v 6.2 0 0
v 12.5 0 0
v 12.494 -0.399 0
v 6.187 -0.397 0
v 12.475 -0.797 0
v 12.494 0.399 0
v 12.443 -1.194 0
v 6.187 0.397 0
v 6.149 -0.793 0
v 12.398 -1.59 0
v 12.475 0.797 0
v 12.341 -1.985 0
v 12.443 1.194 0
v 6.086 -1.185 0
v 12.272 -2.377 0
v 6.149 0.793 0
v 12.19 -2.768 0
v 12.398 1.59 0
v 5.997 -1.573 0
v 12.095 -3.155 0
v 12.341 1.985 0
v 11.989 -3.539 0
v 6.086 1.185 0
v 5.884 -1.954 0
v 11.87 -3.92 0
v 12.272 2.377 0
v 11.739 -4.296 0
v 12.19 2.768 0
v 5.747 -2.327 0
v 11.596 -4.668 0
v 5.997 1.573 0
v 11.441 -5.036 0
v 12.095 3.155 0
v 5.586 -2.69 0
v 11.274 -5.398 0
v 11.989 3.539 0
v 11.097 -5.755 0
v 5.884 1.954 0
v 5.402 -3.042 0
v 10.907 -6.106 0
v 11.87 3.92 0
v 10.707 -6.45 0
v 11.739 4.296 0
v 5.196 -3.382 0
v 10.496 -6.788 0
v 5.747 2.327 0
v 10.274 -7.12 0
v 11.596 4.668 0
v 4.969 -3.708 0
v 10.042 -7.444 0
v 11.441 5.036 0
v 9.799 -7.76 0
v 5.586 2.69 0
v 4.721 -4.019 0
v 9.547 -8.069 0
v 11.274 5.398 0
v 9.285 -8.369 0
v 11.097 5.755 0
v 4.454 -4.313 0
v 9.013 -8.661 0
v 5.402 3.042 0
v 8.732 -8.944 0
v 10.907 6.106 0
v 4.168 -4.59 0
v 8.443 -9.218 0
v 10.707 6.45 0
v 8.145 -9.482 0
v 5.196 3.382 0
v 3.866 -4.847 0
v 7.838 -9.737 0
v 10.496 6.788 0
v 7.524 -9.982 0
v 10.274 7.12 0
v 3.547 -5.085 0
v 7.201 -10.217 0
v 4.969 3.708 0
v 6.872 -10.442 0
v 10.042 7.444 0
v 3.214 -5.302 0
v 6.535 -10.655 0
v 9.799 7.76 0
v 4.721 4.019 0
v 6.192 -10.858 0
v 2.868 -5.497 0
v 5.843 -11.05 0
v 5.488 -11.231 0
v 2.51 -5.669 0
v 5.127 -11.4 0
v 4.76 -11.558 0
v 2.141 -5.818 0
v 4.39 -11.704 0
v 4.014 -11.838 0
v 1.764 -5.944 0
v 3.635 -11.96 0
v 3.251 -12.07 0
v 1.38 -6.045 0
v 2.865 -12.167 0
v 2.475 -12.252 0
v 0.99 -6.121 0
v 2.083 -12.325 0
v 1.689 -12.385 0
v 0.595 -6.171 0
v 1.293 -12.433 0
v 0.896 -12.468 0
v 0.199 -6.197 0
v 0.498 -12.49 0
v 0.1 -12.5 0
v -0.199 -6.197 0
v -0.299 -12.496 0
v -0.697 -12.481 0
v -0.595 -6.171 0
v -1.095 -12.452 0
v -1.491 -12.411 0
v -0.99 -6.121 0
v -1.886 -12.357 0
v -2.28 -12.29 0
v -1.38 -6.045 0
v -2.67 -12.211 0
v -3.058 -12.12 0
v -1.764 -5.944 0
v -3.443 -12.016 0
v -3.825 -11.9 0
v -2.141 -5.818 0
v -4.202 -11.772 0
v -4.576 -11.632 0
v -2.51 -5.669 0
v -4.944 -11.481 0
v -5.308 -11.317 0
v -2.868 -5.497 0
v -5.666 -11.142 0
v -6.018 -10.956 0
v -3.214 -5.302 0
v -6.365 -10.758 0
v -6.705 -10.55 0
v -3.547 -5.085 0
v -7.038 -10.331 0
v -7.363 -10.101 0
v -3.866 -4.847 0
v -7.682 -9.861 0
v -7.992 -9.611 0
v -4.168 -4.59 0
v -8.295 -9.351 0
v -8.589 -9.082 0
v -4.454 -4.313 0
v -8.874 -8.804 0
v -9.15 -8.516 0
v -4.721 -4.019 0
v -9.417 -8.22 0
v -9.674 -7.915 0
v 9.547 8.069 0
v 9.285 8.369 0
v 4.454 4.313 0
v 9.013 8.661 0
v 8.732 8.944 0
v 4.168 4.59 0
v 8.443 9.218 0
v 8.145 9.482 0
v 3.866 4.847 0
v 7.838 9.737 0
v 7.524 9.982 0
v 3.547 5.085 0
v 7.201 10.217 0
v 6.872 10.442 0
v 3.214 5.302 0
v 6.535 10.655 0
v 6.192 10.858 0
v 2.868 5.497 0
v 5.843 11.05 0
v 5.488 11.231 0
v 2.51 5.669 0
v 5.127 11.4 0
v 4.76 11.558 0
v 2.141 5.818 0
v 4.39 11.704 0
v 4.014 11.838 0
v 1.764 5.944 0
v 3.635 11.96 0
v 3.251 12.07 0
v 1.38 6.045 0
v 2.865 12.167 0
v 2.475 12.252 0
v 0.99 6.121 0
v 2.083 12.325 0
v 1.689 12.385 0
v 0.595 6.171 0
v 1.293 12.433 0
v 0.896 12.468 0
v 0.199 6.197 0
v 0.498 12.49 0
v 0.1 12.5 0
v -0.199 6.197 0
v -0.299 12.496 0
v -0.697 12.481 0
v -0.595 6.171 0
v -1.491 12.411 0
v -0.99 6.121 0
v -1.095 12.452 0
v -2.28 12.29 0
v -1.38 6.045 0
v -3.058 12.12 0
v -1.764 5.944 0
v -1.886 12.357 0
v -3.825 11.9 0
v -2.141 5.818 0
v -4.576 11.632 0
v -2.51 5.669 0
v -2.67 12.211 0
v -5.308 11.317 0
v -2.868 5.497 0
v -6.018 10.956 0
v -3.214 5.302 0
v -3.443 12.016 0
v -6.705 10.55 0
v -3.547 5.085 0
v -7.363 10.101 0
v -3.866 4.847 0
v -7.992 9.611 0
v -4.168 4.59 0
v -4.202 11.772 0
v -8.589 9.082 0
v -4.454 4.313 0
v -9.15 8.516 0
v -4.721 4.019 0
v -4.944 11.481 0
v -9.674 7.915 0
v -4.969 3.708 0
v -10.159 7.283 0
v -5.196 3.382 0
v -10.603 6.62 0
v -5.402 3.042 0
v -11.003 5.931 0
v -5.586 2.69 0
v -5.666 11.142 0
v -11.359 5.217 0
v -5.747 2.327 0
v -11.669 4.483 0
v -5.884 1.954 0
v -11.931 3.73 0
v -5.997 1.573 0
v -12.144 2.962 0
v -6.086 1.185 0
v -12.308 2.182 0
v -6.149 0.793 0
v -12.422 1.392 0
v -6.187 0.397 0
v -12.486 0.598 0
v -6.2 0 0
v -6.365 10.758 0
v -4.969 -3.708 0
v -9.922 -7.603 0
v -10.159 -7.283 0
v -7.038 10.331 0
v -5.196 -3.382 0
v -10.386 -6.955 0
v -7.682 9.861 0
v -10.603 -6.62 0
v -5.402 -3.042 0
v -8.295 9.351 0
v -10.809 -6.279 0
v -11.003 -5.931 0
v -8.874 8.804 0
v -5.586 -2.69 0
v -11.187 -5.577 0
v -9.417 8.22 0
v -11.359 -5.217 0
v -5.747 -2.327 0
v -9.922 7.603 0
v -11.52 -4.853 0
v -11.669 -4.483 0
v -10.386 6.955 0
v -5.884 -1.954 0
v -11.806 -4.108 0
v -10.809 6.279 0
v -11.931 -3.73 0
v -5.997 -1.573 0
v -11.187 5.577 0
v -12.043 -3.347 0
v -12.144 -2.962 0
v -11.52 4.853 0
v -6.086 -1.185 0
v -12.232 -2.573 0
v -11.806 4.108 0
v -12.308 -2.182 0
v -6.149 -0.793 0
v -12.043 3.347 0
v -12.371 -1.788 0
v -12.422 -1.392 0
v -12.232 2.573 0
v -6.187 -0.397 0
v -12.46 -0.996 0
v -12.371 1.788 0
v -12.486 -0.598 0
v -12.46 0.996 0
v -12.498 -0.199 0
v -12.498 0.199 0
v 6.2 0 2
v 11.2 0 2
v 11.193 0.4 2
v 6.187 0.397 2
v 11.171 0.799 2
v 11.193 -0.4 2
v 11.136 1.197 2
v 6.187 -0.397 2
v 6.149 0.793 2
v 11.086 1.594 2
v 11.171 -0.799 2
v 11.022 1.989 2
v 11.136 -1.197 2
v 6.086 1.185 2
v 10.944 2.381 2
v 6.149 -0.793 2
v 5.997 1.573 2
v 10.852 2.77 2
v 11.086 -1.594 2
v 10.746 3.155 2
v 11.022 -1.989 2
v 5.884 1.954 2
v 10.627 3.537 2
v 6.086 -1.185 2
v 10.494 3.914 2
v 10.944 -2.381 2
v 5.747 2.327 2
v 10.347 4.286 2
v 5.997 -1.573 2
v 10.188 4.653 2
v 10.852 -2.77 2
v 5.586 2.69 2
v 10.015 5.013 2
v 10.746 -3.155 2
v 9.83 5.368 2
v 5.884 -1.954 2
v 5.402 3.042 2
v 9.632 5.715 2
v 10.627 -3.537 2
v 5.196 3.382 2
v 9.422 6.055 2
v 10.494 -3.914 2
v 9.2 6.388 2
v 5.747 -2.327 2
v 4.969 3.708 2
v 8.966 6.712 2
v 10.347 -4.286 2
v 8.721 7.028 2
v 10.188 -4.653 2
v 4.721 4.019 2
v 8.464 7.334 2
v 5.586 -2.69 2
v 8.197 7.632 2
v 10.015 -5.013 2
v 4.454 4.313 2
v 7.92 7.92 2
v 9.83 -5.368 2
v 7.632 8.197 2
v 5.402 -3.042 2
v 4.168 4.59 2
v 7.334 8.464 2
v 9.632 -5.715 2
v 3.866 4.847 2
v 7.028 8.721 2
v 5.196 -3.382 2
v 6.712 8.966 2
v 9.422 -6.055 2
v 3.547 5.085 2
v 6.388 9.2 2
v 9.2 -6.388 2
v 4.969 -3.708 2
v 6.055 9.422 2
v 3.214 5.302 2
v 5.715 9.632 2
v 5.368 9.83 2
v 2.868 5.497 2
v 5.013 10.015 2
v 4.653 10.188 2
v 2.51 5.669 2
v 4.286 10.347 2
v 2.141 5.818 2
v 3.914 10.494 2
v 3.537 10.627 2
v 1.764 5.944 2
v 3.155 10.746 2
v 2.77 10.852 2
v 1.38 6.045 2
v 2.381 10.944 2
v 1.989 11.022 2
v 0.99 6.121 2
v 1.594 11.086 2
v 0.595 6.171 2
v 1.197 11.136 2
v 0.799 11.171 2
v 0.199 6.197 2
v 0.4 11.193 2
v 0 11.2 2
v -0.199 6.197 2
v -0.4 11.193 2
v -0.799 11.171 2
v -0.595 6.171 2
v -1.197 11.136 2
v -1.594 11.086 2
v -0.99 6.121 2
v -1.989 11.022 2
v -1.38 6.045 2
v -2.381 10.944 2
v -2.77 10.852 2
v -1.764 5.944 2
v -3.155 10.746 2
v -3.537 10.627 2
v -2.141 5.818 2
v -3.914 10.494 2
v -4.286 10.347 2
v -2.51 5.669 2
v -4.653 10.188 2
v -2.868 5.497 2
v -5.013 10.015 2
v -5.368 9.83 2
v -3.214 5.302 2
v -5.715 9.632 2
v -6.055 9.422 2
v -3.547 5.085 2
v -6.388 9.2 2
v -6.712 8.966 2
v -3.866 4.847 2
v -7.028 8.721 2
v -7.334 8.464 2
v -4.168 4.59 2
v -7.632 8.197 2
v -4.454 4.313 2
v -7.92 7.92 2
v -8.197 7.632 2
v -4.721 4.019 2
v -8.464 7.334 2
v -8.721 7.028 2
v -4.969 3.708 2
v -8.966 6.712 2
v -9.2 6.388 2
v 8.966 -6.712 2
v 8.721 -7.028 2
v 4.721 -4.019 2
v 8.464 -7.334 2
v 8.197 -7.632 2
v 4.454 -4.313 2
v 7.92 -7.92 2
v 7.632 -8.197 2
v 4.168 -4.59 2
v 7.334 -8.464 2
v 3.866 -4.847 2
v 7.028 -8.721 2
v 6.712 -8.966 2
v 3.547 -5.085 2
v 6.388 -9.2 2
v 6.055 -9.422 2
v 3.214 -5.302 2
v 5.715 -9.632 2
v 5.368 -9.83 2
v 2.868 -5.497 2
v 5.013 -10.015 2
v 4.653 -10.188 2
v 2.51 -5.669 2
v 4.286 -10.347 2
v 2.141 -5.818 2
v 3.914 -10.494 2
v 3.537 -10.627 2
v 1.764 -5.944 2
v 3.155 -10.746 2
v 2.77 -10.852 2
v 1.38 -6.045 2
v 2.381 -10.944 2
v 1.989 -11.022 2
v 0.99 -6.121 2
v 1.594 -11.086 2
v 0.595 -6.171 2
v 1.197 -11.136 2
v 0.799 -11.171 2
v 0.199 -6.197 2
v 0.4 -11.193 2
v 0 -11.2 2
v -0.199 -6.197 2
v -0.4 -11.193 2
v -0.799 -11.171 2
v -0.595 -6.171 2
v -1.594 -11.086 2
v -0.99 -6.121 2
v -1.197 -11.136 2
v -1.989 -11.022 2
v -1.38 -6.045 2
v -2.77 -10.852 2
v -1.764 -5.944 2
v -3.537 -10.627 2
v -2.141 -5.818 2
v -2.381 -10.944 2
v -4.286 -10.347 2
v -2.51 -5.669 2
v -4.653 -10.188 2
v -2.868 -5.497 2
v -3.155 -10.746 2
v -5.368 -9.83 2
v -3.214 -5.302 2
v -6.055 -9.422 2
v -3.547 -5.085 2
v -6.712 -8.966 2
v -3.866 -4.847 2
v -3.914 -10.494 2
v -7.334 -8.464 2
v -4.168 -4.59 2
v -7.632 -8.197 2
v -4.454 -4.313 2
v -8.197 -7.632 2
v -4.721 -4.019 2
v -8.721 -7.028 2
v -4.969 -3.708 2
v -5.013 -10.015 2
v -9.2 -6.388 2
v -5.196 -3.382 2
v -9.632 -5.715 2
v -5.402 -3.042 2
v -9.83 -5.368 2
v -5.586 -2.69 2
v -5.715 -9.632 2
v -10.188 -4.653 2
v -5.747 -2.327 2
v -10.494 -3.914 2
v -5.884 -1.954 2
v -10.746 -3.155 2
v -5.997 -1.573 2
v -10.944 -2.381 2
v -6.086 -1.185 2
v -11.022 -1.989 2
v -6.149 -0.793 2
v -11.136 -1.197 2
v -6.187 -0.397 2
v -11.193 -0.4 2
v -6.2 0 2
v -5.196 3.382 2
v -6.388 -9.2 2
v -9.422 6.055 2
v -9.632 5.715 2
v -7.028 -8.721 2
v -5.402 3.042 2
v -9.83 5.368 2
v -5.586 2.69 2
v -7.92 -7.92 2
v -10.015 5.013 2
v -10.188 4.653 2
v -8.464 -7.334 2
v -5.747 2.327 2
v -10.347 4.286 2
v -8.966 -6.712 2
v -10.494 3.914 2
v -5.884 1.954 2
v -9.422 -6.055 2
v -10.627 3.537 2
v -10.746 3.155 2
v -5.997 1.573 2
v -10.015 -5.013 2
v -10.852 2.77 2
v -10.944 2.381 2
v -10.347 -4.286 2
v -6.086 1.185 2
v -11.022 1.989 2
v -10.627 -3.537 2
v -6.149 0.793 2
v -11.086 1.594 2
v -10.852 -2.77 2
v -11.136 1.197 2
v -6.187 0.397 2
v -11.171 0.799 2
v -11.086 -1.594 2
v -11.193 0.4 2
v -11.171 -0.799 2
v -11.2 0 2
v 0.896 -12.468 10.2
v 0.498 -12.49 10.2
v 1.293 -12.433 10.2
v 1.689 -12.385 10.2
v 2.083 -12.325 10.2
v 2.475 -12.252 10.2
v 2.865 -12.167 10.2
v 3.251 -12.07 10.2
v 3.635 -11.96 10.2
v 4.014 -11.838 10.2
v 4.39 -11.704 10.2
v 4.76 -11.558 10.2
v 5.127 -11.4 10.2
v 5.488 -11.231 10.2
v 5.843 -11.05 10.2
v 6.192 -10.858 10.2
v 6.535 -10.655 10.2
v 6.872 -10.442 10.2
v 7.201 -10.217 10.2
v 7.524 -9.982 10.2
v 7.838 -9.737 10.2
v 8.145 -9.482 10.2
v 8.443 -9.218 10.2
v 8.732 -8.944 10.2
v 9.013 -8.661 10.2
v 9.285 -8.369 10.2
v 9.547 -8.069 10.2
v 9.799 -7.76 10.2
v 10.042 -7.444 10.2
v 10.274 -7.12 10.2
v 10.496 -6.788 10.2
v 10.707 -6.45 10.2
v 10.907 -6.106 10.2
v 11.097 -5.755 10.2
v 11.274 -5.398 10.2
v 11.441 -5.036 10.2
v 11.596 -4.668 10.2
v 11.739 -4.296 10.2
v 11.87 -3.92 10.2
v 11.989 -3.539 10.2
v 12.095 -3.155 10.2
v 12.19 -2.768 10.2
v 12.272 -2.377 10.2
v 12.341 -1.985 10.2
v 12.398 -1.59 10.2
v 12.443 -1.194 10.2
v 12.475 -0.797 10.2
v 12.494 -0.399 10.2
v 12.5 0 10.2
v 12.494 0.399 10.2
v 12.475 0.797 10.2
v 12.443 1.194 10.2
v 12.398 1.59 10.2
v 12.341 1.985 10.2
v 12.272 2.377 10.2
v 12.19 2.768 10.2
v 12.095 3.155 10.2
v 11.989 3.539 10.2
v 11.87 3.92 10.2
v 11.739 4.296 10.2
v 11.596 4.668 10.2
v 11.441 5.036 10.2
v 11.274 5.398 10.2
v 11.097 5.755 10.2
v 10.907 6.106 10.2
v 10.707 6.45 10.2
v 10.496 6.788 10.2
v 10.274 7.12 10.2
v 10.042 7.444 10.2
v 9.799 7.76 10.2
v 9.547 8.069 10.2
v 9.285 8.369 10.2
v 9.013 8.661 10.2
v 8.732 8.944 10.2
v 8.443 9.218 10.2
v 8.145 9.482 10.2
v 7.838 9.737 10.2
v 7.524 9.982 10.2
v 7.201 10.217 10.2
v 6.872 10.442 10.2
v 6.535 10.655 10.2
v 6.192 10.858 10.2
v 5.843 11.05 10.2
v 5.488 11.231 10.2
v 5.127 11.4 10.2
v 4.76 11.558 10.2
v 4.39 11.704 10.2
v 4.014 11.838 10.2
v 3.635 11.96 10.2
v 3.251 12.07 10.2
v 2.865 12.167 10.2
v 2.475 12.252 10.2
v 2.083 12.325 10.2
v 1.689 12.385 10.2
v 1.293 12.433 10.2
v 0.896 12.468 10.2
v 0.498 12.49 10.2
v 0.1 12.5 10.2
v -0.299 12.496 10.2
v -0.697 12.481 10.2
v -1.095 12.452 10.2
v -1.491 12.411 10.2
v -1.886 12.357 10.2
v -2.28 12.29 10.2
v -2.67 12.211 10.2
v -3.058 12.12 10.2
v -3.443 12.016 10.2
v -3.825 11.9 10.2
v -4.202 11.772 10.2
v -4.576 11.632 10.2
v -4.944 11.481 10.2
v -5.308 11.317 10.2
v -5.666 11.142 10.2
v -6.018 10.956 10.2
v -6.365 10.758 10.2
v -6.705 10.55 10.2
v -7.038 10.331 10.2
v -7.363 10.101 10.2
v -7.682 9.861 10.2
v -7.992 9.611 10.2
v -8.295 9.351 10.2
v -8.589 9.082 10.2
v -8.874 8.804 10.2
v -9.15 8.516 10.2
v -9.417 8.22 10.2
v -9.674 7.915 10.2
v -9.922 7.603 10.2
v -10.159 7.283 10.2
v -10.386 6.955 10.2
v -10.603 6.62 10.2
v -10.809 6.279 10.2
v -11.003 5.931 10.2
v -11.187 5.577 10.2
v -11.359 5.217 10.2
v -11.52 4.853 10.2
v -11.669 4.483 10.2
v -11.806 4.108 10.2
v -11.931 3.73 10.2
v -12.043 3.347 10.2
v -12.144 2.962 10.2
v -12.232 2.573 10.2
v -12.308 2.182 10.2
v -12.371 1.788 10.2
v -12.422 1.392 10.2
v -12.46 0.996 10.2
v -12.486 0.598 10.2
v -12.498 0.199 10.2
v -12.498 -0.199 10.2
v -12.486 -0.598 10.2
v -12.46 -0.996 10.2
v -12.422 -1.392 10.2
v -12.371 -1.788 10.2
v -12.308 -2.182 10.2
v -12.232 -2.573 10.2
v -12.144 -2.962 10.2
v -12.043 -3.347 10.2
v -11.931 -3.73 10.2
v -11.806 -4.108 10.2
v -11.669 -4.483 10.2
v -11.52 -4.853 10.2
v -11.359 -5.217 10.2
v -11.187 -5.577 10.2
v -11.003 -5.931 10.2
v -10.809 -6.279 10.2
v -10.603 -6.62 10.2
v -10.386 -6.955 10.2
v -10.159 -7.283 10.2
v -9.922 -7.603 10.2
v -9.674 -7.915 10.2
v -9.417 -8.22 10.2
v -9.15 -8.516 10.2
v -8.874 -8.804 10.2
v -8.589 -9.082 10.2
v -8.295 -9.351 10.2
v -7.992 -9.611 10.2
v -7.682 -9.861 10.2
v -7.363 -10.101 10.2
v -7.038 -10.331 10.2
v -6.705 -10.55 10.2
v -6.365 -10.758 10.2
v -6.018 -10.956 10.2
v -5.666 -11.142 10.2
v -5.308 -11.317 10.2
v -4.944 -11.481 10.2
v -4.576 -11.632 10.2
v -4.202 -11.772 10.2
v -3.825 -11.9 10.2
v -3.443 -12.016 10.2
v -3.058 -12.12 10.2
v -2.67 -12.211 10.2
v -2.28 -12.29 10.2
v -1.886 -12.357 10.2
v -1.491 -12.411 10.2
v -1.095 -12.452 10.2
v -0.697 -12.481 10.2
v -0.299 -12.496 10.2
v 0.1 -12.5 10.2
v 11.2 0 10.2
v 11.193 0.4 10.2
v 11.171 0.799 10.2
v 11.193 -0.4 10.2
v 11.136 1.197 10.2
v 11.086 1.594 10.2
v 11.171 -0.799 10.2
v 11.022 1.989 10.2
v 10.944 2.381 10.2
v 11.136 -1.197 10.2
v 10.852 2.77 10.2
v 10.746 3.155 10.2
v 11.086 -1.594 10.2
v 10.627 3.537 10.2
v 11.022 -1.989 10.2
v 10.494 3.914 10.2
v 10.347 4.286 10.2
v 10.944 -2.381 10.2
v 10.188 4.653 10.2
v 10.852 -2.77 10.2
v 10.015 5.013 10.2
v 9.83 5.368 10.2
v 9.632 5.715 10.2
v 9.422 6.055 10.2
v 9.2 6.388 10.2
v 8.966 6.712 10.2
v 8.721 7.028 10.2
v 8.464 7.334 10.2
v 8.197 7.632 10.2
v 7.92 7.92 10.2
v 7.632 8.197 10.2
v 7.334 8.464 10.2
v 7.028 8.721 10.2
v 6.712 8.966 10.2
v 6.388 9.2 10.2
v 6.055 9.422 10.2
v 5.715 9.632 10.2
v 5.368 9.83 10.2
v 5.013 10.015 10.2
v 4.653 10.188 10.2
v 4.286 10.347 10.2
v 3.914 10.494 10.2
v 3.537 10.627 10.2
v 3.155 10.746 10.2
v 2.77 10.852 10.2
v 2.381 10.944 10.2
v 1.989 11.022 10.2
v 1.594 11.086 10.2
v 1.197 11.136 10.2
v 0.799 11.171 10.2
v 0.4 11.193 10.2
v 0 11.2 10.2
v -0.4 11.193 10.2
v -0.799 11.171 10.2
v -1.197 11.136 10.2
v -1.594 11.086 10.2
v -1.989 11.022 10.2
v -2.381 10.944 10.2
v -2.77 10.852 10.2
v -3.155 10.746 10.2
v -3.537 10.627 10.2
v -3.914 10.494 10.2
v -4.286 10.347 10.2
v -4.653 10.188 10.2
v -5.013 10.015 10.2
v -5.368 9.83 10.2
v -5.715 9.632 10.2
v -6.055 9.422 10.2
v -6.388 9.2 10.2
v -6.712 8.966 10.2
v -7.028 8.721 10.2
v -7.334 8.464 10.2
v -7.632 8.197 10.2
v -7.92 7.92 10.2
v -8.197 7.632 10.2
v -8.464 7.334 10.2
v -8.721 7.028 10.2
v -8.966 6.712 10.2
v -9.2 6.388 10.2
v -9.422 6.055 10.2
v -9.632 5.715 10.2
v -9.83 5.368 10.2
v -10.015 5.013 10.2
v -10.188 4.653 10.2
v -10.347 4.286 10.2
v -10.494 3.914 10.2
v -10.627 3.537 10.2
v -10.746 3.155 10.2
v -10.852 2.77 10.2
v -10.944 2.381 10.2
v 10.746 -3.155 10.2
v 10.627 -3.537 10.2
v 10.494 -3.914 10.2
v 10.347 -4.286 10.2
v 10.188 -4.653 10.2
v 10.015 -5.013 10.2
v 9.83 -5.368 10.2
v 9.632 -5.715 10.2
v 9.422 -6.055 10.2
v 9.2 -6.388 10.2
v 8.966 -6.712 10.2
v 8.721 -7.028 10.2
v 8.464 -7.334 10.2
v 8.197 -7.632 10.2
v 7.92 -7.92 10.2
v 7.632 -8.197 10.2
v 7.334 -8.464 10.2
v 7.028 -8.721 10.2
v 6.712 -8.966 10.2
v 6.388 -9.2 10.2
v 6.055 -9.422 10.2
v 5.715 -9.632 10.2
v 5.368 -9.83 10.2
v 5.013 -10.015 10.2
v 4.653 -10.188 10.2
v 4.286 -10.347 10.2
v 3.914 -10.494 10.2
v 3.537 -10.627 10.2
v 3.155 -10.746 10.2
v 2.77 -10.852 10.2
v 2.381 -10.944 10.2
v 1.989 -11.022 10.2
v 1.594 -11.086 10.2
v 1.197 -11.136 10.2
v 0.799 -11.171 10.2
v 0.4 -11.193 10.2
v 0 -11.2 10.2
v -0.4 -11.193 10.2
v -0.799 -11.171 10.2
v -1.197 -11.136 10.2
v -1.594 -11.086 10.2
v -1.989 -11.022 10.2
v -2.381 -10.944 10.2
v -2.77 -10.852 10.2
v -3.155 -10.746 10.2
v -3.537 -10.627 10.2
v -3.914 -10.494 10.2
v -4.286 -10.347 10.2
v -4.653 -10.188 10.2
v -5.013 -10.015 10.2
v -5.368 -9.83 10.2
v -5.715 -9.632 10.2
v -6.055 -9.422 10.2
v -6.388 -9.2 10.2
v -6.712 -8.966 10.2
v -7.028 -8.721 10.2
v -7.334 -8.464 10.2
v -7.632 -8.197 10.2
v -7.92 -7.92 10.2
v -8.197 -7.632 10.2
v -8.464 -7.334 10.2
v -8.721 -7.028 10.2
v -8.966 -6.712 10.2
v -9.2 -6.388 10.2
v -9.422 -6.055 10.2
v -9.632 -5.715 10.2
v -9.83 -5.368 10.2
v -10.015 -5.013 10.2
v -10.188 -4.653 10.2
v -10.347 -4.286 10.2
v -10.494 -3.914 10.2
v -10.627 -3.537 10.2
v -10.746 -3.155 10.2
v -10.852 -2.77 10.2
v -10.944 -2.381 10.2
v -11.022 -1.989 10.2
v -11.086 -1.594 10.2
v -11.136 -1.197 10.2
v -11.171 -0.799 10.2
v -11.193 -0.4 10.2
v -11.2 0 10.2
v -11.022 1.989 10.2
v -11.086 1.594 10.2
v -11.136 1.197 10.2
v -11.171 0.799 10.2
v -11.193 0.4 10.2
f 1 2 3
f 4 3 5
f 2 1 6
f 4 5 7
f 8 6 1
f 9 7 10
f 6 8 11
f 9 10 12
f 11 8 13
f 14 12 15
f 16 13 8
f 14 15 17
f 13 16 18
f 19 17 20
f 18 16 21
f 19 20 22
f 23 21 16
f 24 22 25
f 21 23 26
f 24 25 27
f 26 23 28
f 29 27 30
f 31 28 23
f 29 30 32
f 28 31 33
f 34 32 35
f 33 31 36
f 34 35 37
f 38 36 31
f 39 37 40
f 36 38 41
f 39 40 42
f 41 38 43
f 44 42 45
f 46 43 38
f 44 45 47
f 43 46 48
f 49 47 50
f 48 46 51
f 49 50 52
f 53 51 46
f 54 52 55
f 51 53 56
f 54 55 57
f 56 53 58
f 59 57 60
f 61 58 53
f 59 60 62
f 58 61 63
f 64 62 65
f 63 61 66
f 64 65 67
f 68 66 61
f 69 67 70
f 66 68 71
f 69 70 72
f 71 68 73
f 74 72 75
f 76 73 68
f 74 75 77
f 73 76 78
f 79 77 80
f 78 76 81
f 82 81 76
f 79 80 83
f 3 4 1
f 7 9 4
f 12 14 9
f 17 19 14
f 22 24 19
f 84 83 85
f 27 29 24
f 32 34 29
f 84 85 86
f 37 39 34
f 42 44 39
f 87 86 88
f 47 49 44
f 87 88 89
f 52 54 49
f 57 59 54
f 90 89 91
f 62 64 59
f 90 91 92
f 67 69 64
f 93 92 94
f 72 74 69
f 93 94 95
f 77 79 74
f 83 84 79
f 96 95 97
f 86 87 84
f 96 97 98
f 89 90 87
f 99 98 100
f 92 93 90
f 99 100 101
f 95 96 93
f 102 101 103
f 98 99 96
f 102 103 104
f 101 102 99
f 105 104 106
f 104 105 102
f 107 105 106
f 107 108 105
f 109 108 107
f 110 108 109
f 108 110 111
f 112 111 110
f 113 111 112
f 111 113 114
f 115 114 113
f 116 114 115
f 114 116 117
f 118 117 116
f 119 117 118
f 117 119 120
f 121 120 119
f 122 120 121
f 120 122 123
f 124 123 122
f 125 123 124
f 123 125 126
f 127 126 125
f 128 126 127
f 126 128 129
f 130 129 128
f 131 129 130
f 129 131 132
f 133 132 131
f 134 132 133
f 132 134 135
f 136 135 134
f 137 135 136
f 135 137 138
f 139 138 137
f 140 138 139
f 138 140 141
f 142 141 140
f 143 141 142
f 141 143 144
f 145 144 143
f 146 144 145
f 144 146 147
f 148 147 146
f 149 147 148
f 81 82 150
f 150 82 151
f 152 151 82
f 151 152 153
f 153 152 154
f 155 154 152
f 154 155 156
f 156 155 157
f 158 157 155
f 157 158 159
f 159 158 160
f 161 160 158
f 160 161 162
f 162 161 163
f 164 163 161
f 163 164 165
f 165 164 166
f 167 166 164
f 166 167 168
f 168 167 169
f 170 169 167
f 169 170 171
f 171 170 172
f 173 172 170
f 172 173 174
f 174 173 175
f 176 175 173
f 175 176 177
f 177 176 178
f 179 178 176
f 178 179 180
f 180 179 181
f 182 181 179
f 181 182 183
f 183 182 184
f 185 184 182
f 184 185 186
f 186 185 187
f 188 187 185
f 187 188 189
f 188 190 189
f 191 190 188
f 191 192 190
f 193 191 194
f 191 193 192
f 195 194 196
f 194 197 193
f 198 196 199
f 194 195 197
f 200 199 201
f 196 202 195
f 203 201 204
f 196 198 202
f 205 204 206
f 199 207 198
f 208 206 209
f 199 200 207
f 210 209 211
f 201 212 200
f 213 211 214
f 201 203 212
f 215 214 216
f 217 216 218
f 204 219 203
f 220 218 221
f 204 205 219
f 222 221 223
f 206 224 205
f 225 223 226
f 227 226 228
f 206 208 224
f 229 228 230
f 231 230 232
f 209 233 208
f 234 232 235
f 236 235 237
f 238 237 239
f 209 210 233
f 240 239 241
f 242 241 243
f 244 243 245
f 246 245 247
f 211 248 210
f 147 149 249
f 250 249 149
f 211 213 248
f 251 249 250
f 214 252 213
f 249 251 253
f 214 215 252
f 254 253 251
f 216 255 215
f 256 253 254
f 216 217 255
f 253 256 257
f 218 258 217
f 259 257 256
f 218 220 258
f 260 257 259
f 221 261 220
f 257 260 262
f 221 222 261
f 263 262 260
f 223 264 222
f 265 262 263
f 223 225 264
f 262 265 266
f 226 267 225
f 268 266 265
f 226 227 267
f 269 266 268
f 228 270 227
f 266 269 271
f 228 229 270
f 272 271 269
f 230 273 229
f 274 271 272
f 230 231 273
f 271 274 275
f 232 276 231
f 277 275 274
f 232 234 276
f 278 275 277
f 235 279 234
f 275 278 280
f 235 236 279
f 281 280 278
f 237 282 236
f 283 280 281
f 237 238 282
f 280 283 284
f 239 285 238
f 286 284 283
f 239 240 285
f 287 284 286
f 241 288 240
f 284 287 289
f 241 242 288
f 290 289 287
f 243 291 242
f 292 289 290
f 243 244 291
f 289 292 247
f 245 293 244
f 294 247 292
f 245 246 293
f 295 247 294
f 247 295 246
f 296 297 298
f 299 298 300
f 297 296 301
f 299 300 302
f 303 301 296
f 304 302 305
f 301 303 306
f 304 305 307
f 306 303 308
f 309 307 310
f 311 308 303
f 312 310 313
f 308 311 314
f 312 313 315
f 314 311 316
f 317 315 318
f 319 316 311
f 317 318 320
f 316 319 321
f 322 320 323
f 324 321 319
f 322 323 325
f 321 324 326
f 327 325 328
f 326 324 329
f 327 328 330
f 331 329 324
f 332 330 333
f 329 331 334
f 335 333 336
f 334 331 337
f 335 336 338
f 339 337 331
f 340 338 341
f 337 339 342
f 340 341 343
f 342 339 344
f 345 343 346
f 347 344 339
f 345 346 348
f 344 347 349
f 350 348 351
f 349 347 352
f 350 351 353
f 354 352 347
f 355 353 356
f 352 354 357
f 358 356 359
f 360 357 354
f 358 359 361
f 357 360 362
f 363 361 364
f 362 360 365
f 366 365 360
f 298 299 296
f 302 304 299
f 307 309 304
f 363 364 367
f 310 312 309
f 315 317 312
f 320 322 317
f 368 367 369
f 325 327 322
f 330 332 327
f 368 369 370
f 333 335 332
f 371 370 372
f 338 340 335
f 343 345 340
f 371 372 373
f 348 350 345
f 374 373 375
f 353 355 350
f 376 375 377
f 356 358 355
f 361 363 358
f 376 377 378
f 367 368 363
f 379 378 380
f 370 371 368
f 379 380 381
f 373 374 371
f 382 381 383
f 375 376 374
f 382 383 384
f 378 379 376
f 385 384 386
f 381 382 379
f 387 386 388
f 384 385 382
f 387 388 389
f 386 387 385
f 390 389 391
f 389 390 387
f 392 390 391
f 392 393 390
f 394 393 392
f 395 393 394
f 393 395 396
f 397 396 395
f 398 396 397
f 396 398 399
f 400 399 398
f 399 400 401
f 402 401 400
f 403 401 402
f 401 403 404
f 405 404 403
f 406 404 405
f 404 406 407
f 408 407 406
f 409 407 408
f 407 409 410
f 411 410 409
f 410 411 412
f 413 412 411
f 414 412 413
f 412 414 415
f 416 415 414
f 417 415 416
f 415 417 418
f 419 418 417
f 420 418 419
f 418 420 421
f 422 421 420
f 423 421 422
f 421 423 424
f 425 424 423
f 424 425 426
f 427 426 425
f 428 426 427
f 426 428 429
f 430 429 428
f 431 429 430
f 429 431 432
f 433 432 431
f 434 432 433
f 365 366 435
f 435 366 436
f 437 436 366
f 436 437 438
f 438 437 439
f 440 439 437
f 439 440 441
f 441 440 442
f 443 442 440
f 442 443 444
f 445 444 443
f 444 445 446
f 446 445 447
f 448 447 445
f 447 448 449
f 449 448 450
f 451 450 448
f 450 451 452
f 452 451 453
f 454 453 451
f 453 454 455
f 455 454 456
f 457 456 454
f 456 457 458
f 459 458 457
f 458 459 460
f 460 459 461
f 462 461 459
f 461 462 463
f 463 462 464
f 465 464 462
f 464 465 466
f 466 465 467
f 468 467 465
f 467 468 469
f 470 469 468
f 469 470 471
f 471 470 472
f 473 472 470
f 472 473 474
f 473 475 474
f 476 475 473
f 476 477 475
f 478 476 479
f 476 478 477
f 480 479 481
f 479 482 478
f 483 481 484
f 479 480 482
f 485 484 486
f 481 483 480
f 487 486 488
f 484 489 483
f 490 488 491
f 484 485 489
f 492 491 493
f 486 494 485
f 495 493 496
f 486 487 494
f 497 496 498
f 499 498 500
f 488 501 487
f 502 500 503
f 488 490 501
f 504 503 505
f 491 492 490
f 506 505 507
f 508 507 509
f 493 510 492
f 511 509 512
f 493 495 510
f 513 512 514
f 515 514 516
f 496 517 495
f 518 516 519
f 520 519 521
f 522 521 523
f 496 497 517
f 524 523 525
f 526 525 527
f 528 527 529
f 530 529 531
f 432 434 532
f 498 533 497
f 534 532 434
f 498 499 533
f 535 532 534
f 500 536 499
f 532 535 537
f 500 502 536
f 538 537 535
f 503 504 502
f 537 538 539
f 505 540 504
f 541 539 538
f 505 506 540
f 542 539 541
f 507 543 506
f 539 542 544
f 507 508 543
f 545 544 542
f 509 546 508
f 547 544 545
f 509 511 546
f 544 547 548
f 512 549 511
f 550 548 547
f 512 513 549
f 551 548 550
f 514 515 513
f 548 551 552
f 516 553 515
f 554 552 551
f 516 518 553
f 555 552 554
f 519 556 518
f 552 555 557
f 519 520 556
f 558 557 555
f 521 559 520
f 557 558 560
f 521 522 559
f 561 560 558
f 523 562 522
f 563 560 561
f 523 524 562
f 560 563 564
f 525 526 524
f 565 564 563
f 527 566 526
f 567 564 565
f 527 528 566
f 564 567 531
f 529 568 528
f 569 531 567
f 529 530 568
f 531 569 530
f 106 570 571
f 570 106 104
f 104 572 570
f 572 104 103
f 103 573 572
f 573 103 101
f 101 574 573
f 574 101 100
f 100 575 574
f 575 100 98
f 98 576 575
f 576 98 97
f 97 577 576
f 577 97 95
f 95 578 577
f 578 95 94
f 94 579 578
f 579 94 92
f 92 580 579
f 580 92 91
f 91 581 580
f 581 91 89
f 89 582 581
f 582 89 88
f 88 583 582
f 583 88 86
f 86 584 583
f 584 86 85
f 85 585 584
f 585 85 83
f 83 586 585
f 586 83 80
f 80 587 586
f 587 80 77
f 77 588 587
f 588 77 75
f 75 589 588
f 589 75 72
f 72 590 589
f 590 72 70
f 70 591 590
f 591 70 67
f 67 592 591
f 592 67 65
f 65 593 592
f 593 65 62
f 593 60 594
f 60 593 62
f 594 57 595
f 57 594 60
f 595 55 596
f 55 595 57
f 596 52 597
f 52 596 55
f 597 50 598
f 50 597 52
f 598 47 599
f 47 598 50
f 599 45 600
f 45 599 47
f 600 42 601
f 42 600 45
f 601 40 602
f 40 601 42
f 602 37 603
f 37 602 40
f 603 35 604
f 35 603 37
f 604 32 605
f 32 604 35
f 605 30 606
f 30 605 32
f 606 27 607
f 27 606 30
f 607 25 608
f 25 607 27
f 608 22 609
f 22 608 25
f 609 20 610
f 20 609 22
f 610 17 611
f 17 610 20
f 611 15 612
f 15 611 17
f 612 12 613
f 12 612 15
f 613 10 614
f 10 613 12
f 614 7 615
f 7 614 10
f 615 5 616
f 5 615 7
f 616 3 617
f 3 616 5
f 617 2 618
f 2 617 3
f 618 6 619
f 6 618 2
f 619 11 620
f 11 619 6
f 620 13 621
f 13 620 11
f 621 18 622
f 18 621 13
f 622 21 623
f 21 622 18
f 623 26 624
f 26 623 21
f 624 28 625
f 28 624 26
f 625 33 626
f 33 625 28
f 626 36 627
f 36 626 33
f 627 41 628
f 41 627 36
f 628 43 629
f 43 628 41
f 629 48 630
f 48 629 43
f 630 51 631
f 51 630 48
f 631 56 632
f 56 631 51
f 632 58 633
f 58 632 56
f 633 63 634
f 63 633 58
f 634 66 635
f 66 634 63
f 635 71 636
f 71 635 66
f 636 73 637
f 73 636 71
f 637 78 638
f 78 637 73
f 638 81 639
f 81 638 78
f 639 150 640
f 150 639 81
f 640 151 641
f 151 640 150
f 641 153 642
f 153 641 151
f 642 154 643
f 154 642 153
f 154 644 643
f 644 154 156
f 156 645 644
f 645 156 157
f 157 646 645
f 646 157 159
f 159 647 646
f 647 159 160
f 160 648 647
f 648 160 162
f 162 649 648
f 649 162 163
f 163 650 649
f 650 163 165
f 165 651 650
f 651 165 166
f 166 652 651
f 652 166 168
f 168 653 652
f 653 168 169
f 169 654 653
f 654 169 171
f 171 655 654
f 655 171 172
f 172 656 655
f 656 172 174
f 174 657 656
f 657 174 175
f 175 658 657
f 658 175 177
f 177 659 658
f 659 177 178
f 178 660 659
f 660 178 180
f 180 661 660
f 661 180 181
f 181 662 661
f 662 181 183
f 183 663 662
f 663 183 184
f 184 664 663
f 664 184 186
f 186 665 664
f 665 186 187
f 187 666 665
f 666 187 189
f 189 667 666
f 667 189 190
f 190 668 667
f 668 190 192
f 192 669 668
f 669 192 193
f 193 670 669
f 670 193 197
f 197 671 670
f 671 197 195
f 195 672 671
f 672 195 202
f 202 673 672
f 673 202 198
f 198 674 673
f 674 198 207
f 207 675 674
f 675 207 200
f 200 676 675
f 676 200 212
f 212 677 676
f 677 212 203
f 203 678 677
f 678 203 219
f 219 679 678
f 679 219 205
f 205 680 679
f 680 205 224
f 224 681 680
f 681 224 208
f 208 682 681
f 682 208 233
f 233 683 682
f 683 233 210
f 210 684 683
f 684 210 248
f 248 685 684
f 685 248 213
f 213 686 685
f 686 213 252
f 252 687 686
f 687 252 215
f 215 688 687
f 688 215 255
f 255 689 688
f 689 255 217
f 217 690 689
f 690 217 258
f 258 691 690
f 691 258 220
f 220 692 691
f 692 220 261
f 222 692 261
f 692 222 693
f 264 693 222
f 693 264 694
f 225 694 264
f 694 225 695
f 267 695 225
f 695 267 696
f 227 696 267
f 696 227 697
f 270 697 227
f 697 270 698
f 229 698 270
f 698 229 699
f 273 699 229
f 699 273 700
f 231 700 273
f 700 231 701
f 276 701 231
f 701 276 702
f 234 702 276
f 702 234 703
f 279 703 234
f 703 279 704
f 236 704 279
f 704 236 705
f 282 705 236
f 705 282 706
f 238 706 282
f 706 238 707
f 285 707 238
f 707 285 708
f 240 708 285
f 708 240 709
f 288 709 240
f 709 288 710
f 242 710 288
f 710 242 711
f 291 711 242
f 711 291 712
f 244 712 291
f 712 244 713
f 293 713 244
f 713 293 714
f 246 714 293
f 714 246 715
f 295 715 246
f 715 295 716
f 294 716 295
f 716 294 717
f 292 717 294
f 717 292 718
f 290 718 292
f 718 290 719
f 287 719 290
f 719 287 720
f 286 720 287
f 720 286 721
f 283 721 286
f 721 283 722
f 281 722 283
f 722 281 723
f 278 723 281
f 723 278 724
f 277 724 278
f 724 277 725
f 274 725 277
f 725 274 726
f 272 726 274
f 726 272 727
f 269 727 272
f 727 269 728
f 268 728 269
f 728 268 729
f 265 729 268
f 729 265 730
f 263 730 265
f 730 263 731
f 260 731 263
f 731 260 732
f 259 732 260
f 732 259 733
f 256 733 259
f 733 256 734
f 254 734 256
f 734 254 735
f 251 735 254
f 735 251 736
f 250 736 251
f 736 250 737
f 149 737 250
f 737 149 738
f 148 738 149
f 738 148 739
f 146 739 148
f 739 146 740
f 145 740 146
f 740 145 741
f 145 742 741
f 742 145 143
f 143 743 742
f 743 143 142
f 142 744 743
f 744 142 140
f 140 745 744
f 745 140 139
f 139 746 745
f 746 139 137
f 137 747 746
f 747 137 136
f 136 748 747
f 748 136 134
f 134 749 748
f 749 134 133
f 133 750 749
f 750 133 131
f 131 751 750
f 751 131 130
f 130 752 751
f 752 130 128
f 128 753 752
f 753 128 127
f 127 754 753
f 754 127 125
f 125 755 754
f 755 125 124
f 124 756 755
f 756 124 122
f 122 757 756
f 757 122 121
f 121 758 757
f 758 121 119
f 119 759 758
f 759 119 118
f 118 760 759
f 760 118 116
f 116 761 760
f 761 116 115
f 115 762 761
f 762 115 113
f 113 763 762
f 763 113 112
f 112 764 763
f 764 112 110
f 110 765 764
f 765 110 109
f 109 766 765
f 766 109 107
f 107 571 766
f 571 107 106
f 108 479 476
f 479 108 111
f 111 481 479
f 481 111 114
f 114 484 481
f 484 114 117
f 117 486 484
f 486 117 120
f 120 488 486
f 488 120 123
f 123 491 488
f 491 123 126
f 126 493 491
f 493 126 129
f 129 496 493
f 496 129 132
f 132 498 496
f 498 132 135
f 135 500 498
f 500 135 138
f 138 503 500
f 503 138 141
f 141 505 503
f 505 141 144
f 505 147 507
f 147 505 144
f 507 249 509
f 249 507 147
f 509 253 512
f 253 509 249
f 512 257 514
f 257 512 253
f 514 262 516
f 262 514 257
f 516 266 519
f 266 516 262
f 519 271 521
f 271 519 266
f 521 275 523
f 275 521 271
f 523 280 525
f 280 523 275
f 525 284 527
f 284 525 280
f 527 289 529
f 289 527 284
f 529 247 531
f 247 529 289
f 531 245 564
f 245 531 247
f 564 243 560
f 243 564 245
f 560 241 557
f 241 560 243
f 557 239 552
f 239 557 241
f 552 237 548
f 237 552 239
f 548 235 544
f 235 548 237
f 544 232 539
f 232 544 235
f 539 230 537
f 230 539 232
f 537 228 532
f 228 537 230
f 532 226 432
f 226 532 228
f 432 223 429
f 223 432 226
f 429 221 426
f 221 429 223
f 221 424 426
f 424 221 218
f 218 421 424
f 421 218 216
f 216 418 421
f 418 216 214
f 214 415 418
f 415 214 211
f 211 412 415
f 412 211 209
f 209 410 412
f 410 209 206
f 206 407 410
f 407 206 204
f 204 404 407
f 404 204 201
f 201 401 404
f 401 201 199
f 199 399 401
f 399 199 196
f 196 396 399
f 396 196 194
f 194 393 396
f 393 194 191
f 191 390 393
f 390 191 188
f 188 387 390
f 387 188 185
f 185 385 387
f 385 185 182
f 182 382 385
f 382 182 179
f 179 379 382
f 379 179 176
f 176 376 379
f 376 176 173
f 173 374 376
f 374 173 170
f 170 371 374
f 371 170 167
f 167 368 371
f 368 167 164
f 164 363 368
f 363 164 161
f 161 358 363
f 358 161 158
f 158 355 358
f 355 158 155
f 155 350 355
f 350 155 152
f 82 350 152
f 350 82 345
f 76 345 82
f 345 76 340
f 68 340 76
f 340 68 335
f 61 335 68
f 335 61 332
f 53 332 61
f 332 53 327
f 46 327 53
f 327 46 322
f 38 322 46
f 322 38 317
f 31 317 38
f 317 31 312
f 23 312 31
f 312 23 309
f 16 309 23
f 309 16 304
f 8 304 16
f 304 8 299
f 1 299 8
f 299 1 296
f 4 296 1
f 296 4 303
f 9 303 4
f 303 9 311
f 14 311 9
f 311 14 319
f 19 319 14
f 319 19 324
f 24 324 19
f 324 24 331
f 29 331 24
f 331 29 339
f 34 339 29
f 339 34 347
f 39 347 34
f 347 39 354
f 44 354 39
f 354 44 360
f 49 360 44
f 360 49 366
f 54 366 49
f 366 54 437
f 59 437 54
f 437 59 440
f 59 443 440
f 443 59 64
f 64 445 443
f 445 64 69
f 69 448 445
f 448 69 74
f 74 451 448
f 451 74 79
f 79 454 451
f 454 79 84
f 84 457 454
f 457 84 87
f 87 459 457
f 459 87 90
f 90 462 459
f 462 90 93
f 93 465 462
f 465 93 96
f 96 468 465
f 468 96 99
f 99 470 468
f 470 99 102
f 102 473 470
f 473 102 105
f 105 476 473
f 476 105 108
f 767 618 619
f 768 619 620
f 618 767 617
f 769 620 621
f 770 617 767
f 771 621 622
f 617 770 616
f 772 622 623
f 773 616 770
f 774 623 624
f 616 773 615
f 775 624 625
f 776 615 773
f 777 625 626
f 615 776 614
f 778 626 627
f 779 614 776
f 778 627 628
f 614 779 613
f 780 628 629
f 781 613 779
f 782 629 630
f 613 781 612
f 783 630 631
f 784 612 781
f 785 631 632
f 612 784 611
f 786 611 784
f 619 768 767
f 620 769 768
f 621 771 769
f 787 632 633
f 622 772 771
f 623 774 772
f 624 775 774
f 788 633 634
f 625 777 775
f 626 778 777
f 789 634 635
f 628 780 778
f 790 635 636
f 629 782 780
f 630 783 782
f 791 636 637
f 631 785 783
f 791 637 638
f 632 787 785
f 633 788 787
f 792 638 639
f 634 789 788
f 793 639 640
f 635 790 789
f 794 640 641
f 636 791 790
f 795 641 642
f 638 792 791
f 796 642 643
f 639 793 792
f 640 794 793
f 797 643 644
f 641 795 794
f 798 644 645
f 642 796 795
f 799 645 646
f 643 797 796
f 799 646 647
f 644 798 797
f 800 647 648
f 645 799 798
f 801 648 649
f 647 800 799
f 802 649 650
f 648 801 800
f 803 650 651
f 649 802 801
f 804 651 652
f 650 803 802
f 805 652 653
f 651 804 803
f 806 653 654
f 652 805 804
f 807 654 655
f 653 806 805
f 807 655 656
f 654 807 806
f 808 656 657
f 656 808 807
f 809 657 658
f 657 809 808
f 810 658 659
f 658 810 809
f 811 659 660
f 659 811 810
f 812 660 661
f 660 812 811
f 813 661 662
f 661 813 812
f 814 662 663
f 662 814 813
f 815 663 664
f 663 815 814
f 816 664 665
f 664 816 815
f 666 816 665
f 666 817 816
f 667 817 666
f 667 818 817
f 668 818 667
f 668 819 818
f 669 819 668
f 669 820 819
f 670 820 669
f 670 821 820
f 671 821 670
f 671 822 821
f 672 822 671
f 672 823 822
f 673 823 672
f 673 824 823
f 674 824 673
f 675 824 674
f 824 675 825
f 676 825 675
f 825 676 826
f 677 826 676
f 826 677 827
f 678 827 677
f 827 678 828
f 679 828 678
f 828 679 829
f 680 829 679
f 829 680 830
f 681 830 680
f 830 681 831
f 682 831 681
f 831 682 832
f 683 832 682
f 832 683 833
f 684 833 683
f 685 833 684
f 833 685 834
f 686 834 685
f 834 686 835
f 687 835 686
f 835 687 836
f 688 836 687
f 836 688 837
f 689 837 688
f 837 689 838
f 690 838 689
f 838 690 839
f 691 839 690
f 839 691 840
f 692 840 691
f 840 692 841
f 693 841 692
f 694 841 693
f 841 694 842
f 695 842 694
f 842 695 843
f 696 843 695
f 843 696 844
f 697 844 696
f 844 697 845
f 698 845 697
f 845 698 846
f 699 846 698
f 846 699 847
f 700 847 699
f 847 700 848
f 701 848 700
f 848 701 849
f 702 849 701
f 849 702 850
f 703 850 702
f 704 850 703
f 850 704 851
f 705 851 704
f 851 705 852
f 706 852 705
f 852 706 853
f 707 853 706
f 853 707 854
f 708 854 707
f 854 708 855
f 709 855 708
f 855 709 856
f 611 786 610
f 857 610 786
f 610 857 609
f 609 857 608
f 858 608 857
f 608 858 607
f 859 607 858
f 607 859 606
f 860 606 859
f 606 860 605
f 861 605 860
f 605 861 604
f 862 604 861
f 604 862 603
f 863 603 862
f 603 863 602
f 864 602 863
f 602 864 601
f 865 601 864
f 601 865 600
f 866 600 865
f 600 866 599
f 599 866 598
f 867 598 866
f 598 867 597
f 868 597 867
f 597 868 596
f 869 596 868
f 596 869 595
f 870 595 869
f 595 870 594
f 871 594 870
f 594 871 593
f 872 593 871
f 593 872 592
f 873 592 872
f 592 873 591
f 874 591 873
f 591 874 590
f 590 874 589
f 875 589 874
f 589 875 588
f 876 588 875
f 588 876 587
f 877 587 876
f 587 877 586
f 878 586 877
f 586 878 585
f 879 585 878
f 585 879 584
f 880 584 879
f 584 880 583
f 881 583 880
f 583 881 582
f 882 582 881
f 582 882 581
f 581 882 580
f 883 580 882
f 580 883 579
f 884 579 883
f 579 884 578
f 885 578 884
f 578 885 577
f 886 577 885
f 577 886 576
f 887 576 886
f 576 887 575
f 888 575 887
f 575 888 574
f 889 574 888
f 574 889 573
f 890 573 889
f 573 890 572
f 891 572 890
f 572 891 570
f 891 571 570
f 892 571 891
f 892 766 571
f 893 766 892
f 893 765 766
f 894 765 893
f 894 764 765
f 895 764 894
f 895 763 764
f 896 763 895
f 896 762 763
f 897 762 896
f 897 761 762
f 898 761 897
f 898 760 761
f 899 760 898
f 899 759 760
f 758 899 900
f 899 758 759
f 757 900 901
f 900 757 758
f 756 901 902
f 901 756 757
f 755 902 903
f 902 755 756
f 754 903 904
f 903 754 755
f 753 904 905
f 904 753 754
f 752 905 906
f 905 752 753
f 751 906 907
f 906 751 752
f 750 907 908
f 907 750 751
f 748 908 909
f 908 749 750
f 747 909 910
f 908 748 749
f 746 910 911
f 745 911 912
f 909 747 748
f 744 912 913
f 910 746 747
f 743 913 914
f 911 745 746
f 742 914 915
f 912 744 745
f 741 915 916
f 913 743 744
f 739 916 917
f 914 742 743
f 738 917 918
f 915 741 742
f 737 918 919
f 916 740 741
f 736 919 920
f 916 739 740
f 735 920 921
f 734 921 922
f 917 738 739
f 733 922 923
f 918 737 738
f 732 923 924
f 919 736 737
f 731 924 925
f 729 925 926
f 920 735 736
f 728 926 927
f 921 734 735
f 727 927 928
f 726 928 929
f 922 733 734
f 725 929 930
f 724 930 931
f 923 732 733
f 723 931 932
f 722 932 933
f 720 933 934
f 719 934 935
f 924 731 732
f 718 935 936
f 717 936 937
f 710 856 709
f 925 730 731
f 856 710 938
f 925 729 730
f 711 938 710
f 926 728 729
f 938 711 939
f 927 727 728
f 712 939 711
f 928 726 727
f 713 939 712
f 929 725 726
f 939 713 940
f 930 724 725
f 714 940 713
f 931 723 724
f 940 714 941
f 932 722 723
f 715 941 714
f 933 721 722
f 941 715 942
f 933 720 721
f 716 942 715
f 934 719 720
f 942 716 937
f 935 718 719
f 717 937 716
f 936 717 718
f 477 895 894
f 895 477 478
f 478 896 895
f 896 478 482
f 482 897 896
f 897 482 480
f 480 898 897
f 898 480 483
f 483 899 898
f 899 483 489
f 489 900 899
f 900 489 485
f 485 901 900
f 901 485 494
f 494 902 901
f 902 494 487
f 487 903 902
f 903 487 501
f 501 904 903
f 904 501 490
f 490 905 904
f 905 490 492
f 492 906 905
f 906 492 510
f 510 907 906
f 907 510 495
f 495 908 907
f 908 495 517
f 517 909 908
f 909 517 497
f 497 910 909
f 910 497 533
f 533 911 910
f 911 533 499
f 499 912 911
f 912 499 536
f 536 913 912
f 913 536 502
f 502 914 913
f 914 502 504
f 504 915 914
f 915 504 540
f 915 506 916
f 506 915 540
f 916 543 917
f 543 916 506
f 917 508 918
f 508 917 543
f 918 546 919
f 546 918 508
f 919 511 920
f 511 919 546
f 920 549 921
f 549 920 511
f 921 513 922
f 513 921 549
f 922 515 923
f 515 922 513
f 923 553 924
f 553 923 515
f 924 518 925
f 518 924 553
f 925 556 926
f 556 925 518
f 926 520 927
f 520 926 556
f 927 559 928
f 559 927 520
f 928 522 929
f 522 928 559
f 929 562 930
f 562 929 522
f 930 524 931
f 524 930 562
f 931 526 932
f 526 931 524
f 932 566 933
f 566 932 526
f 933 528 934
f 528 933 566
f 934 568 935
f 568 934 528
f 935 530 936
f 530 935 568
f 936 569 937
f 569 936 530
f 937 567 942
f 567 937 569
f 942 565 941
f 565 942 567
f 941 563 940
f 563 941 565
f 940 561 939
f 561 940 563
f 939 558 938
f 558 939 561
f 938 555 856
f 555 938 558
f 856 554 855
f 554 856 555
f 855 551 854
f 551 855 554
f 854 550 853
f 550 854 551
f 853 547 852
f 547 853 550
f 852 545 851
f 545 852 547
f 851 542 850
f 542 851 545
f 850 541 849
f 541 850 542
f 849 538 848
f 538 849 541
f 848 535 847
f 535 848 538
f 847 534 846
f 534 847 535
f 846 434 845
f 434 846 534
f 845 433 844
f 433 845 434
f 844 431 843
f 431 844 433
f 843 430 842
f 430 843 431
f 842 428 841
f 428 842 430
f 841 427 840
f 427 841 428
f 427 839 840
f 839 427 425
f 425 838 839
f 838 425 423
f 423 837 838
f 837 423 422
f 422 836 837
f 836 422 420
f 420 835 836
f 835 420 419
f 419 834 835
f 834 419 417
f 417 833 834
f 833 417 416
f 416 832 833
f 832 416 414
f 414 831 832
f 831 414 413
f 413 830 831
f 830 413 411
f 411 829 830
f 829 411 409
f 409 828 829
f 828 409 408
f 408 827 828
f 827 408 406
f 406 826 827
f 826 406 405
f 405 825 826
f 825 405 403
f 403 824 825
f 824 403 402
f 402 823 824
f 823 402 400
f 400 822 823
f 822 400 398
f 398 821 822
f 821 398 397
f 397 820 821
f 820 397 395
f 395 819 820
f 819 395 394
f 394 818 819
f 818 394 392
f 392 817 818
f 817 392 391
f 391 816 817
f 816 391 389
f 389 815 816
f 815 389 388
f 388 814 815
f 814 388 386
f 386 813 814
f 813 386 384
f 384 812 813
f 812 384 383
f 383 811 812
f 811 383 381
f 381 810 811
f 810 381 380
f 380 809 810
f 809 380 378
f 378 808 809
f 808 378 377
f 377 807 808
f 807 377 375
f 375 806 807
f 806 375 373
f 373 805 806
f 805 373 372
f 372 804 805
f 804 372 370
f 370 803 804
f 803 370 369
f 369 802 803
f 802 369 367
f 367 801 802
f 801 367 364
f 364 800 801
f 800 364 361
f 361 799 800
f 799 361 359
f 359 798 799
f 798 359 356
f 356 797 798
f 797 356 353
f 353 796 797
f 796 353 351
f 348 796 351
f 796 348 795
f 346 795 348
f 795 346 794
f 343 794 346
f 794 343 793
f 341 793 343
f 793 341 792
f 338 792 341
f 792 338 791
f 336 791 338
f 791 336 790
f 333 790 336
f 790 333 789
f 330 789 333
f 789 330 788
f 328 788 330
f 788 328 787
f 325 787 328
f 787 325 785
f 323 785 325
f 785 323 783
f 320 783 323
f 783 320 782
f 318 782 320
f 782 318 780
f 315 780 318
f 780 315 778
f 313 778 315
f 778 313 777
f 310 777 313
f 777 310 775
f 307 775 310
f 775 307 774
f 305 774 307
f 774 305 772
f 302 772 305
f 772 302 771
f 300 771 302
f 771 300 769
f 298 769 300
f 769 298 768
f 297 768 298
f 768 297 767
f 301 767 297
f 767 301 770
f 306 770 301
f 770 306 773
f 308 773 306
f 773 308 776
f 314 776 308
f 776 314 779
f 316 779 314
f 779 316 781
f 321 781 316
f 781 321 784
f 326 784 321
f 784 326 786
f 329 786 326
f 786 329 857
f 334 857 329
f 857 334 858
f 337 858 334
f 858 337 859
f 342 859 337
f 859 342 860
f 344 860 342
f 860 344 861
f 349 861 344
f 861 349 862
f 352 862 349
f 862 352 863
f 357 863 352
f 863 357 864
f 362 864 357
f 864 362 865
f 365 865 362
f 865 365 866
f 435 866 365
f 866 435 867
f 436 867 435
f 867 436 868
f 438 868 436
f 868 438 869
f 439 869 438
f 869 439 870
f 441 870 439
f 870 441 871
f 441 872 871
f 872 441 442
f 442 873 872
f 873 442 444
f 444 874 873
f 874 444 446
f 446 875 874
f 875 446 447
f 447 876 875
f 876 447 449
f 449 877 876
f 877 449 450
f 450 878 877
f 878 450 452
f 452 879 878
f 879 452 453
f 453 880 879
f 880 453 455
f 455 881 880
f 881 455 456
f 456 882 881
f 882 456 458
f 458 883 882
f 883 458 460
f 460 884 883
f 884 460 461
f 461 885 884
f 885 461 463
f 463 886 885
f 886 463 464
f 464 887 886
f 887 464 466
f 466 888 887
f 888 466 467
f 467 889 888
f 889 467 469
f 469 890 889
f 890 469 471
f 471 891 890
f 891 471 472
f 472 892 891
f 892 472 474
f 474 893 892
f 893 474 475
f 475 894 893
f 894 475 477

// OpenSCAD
use <MCAD/2Dshapes.scad>
use <MCAD/polyholes.scad>

$fa = 1;
$fs = 0.4;

D=25;
TOL=0.2;
linear_extrude(2) donutSlice(12/2+TOL, D/2, 0, 360);
translate([0, 0, 2-0.0001]) linear_extrude(8.2) donutSlice(22/2+TOL, D/2, 0, 360);

//polyhole(r=5, h=10);
